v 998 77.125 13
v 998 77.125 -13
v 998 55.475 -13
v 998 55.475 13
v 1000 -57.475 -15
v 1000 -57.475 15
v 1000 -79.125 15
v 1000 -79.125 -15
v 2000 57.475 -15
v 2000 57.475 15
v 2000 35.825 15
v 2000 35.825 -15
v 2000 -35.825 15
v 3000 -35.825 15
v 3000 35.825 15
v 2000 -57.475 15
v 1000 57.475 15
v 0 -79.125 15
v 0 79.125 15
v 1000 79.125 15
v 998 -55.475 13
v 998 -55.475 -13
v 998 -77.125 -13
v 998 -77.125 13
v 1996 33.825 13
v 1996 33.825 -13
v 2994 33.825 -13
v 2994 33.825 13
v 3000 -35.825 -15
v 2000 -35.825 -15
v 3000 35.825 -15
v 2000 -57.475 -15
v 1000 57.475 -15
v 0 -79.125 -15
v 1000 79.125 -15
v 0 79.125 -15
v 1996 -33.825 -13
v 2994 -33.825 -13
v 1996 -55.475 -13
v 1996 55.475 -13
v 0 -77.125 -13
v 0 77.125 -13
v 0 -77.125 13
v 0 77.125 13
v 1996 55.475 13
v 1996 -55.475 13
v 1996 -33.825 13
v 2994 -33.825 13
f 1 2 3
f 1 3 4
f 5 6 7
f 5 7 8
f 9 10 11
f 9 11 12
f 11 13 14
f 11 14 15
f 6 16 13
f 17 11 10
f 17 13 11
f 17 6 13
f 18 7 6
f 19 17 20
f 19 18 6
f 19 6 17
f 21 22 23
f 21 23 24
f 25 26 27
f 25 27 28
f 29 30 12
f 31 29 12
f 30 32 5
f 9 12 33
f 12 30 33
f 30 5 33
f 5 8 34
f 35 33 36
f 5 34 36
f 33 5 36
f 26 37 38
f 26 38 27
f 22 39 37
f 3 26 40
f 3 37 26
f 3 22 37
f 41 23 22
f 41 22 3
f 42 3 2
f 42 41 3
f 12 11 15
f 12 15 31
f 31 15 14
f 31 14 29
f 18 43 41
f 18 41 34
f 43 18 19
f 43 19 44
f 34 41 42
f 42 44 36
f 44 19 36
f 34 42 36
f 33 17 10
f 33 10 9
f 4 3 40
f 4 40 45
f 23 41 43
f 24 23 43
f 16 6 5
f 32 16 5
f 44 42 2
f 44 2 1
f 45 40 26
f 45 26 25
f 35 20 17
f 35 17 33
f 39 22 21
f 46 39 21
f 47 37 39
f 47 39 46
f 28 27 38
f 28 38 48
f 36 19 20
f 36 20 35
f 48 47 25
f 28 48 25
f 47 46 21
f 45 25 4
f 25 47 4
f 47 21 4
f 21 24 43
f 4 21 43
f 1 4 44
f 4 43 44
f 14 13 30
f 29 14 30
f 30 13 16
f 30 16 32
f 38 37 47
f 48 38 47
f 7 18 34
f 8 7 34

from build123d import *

# Parameters (mm, degrees)
SKETCH1_W           = 30
SKETCH1_H           = 158.25
BOSS_EXTRUDE1_DEPTH = 1000
SKETCH3_W           = 30
SKETCH3_H           = 114.95
BOSS_EXTRUDE2_DEPTH = 1000
SKETCH4_W           = 30
SKETCH4_H           = 71.65
BOSS_EXTRUDE3_DEPTH = 1000
SKETCH5_W           = 26
SKETCH5_H           = 154.25
CUT_EXTRUDE1_DEPTH  = 998
SKETCH6_W           = 26
SKETCH6_H           = 110.95
CUT_EXTRUDE2_DEPTH  = 998
SKETCH7_W           = 26
SKETCH7_H           = 67.65
CUT_EXTRUDE3_DEPTH  = 998


with BuildPart() as part:
    # Sketch1 → Boss-Extrude1 (new body)
    with BuildSketch(Plane(origin=(0, 0, 0), x_dir=(0, 0, -1), z_dir=(1, 0, 0))):
        Rectangle(SKETCH1_W, SKETCH1_H)
    extrude(amount=BOSS_EXTRUDE1_DEPTH)

    # Sketch3 → Boss-Extrude2 (add)
    with BuildSketch(Plane(origin=(1000, 0, 0), x_dir=(0, 0, -1), z_dir=(1, 0, 0))):
        Rectangle(SKETCH3_W, SKETCH3_H)
    extrude(amount=BOSS_EXTRUDE2_DEPTH)

    # Sketch4 → Boss-Extrude3 (add)
    with BuildSketch(Plane(origin=(2000, 0, 0), x_dir=(0, 0, -1), z_dir=(1, 0, 0))):
        Rectangle(SKETCH4_W, SKETCH4_H)
    extrude(amount=BOSS_EXTRUDE3_DEPTH)

    # Sketch5 → Cut-Extrude1 (cut)
    with BuildSketch(Plane.ZY):
        Rectangle(SKETCH5_W, SKETCH5_H)
    extrude(amount=-CUT_EXTRUDE1_DEPTH, mode=Mode.SUBTRACT)

    # Sketch6 → Cut-Extrude2 (cut)
    with BuildSketch(Plane.ZY.offset(-998)):
        Rectangle(SKETCH6_W, SKETCH6_H)
    extrude(amount=-CUT_EXTRUDE2_DEPTH, mode=Mode.SUBTRACT)

    # Sketch7 → Cut-Extrude3 (cut)
    with BuildSketch(Plane.ZY.offset(-1996)):
        Rectangle(SKETCH7_W, SKETCH7_H)
    extrude(amount=-CUT_EXTRUDE3_DEPTH, mode=Mode.SUBTRACT)


solid = part.part
